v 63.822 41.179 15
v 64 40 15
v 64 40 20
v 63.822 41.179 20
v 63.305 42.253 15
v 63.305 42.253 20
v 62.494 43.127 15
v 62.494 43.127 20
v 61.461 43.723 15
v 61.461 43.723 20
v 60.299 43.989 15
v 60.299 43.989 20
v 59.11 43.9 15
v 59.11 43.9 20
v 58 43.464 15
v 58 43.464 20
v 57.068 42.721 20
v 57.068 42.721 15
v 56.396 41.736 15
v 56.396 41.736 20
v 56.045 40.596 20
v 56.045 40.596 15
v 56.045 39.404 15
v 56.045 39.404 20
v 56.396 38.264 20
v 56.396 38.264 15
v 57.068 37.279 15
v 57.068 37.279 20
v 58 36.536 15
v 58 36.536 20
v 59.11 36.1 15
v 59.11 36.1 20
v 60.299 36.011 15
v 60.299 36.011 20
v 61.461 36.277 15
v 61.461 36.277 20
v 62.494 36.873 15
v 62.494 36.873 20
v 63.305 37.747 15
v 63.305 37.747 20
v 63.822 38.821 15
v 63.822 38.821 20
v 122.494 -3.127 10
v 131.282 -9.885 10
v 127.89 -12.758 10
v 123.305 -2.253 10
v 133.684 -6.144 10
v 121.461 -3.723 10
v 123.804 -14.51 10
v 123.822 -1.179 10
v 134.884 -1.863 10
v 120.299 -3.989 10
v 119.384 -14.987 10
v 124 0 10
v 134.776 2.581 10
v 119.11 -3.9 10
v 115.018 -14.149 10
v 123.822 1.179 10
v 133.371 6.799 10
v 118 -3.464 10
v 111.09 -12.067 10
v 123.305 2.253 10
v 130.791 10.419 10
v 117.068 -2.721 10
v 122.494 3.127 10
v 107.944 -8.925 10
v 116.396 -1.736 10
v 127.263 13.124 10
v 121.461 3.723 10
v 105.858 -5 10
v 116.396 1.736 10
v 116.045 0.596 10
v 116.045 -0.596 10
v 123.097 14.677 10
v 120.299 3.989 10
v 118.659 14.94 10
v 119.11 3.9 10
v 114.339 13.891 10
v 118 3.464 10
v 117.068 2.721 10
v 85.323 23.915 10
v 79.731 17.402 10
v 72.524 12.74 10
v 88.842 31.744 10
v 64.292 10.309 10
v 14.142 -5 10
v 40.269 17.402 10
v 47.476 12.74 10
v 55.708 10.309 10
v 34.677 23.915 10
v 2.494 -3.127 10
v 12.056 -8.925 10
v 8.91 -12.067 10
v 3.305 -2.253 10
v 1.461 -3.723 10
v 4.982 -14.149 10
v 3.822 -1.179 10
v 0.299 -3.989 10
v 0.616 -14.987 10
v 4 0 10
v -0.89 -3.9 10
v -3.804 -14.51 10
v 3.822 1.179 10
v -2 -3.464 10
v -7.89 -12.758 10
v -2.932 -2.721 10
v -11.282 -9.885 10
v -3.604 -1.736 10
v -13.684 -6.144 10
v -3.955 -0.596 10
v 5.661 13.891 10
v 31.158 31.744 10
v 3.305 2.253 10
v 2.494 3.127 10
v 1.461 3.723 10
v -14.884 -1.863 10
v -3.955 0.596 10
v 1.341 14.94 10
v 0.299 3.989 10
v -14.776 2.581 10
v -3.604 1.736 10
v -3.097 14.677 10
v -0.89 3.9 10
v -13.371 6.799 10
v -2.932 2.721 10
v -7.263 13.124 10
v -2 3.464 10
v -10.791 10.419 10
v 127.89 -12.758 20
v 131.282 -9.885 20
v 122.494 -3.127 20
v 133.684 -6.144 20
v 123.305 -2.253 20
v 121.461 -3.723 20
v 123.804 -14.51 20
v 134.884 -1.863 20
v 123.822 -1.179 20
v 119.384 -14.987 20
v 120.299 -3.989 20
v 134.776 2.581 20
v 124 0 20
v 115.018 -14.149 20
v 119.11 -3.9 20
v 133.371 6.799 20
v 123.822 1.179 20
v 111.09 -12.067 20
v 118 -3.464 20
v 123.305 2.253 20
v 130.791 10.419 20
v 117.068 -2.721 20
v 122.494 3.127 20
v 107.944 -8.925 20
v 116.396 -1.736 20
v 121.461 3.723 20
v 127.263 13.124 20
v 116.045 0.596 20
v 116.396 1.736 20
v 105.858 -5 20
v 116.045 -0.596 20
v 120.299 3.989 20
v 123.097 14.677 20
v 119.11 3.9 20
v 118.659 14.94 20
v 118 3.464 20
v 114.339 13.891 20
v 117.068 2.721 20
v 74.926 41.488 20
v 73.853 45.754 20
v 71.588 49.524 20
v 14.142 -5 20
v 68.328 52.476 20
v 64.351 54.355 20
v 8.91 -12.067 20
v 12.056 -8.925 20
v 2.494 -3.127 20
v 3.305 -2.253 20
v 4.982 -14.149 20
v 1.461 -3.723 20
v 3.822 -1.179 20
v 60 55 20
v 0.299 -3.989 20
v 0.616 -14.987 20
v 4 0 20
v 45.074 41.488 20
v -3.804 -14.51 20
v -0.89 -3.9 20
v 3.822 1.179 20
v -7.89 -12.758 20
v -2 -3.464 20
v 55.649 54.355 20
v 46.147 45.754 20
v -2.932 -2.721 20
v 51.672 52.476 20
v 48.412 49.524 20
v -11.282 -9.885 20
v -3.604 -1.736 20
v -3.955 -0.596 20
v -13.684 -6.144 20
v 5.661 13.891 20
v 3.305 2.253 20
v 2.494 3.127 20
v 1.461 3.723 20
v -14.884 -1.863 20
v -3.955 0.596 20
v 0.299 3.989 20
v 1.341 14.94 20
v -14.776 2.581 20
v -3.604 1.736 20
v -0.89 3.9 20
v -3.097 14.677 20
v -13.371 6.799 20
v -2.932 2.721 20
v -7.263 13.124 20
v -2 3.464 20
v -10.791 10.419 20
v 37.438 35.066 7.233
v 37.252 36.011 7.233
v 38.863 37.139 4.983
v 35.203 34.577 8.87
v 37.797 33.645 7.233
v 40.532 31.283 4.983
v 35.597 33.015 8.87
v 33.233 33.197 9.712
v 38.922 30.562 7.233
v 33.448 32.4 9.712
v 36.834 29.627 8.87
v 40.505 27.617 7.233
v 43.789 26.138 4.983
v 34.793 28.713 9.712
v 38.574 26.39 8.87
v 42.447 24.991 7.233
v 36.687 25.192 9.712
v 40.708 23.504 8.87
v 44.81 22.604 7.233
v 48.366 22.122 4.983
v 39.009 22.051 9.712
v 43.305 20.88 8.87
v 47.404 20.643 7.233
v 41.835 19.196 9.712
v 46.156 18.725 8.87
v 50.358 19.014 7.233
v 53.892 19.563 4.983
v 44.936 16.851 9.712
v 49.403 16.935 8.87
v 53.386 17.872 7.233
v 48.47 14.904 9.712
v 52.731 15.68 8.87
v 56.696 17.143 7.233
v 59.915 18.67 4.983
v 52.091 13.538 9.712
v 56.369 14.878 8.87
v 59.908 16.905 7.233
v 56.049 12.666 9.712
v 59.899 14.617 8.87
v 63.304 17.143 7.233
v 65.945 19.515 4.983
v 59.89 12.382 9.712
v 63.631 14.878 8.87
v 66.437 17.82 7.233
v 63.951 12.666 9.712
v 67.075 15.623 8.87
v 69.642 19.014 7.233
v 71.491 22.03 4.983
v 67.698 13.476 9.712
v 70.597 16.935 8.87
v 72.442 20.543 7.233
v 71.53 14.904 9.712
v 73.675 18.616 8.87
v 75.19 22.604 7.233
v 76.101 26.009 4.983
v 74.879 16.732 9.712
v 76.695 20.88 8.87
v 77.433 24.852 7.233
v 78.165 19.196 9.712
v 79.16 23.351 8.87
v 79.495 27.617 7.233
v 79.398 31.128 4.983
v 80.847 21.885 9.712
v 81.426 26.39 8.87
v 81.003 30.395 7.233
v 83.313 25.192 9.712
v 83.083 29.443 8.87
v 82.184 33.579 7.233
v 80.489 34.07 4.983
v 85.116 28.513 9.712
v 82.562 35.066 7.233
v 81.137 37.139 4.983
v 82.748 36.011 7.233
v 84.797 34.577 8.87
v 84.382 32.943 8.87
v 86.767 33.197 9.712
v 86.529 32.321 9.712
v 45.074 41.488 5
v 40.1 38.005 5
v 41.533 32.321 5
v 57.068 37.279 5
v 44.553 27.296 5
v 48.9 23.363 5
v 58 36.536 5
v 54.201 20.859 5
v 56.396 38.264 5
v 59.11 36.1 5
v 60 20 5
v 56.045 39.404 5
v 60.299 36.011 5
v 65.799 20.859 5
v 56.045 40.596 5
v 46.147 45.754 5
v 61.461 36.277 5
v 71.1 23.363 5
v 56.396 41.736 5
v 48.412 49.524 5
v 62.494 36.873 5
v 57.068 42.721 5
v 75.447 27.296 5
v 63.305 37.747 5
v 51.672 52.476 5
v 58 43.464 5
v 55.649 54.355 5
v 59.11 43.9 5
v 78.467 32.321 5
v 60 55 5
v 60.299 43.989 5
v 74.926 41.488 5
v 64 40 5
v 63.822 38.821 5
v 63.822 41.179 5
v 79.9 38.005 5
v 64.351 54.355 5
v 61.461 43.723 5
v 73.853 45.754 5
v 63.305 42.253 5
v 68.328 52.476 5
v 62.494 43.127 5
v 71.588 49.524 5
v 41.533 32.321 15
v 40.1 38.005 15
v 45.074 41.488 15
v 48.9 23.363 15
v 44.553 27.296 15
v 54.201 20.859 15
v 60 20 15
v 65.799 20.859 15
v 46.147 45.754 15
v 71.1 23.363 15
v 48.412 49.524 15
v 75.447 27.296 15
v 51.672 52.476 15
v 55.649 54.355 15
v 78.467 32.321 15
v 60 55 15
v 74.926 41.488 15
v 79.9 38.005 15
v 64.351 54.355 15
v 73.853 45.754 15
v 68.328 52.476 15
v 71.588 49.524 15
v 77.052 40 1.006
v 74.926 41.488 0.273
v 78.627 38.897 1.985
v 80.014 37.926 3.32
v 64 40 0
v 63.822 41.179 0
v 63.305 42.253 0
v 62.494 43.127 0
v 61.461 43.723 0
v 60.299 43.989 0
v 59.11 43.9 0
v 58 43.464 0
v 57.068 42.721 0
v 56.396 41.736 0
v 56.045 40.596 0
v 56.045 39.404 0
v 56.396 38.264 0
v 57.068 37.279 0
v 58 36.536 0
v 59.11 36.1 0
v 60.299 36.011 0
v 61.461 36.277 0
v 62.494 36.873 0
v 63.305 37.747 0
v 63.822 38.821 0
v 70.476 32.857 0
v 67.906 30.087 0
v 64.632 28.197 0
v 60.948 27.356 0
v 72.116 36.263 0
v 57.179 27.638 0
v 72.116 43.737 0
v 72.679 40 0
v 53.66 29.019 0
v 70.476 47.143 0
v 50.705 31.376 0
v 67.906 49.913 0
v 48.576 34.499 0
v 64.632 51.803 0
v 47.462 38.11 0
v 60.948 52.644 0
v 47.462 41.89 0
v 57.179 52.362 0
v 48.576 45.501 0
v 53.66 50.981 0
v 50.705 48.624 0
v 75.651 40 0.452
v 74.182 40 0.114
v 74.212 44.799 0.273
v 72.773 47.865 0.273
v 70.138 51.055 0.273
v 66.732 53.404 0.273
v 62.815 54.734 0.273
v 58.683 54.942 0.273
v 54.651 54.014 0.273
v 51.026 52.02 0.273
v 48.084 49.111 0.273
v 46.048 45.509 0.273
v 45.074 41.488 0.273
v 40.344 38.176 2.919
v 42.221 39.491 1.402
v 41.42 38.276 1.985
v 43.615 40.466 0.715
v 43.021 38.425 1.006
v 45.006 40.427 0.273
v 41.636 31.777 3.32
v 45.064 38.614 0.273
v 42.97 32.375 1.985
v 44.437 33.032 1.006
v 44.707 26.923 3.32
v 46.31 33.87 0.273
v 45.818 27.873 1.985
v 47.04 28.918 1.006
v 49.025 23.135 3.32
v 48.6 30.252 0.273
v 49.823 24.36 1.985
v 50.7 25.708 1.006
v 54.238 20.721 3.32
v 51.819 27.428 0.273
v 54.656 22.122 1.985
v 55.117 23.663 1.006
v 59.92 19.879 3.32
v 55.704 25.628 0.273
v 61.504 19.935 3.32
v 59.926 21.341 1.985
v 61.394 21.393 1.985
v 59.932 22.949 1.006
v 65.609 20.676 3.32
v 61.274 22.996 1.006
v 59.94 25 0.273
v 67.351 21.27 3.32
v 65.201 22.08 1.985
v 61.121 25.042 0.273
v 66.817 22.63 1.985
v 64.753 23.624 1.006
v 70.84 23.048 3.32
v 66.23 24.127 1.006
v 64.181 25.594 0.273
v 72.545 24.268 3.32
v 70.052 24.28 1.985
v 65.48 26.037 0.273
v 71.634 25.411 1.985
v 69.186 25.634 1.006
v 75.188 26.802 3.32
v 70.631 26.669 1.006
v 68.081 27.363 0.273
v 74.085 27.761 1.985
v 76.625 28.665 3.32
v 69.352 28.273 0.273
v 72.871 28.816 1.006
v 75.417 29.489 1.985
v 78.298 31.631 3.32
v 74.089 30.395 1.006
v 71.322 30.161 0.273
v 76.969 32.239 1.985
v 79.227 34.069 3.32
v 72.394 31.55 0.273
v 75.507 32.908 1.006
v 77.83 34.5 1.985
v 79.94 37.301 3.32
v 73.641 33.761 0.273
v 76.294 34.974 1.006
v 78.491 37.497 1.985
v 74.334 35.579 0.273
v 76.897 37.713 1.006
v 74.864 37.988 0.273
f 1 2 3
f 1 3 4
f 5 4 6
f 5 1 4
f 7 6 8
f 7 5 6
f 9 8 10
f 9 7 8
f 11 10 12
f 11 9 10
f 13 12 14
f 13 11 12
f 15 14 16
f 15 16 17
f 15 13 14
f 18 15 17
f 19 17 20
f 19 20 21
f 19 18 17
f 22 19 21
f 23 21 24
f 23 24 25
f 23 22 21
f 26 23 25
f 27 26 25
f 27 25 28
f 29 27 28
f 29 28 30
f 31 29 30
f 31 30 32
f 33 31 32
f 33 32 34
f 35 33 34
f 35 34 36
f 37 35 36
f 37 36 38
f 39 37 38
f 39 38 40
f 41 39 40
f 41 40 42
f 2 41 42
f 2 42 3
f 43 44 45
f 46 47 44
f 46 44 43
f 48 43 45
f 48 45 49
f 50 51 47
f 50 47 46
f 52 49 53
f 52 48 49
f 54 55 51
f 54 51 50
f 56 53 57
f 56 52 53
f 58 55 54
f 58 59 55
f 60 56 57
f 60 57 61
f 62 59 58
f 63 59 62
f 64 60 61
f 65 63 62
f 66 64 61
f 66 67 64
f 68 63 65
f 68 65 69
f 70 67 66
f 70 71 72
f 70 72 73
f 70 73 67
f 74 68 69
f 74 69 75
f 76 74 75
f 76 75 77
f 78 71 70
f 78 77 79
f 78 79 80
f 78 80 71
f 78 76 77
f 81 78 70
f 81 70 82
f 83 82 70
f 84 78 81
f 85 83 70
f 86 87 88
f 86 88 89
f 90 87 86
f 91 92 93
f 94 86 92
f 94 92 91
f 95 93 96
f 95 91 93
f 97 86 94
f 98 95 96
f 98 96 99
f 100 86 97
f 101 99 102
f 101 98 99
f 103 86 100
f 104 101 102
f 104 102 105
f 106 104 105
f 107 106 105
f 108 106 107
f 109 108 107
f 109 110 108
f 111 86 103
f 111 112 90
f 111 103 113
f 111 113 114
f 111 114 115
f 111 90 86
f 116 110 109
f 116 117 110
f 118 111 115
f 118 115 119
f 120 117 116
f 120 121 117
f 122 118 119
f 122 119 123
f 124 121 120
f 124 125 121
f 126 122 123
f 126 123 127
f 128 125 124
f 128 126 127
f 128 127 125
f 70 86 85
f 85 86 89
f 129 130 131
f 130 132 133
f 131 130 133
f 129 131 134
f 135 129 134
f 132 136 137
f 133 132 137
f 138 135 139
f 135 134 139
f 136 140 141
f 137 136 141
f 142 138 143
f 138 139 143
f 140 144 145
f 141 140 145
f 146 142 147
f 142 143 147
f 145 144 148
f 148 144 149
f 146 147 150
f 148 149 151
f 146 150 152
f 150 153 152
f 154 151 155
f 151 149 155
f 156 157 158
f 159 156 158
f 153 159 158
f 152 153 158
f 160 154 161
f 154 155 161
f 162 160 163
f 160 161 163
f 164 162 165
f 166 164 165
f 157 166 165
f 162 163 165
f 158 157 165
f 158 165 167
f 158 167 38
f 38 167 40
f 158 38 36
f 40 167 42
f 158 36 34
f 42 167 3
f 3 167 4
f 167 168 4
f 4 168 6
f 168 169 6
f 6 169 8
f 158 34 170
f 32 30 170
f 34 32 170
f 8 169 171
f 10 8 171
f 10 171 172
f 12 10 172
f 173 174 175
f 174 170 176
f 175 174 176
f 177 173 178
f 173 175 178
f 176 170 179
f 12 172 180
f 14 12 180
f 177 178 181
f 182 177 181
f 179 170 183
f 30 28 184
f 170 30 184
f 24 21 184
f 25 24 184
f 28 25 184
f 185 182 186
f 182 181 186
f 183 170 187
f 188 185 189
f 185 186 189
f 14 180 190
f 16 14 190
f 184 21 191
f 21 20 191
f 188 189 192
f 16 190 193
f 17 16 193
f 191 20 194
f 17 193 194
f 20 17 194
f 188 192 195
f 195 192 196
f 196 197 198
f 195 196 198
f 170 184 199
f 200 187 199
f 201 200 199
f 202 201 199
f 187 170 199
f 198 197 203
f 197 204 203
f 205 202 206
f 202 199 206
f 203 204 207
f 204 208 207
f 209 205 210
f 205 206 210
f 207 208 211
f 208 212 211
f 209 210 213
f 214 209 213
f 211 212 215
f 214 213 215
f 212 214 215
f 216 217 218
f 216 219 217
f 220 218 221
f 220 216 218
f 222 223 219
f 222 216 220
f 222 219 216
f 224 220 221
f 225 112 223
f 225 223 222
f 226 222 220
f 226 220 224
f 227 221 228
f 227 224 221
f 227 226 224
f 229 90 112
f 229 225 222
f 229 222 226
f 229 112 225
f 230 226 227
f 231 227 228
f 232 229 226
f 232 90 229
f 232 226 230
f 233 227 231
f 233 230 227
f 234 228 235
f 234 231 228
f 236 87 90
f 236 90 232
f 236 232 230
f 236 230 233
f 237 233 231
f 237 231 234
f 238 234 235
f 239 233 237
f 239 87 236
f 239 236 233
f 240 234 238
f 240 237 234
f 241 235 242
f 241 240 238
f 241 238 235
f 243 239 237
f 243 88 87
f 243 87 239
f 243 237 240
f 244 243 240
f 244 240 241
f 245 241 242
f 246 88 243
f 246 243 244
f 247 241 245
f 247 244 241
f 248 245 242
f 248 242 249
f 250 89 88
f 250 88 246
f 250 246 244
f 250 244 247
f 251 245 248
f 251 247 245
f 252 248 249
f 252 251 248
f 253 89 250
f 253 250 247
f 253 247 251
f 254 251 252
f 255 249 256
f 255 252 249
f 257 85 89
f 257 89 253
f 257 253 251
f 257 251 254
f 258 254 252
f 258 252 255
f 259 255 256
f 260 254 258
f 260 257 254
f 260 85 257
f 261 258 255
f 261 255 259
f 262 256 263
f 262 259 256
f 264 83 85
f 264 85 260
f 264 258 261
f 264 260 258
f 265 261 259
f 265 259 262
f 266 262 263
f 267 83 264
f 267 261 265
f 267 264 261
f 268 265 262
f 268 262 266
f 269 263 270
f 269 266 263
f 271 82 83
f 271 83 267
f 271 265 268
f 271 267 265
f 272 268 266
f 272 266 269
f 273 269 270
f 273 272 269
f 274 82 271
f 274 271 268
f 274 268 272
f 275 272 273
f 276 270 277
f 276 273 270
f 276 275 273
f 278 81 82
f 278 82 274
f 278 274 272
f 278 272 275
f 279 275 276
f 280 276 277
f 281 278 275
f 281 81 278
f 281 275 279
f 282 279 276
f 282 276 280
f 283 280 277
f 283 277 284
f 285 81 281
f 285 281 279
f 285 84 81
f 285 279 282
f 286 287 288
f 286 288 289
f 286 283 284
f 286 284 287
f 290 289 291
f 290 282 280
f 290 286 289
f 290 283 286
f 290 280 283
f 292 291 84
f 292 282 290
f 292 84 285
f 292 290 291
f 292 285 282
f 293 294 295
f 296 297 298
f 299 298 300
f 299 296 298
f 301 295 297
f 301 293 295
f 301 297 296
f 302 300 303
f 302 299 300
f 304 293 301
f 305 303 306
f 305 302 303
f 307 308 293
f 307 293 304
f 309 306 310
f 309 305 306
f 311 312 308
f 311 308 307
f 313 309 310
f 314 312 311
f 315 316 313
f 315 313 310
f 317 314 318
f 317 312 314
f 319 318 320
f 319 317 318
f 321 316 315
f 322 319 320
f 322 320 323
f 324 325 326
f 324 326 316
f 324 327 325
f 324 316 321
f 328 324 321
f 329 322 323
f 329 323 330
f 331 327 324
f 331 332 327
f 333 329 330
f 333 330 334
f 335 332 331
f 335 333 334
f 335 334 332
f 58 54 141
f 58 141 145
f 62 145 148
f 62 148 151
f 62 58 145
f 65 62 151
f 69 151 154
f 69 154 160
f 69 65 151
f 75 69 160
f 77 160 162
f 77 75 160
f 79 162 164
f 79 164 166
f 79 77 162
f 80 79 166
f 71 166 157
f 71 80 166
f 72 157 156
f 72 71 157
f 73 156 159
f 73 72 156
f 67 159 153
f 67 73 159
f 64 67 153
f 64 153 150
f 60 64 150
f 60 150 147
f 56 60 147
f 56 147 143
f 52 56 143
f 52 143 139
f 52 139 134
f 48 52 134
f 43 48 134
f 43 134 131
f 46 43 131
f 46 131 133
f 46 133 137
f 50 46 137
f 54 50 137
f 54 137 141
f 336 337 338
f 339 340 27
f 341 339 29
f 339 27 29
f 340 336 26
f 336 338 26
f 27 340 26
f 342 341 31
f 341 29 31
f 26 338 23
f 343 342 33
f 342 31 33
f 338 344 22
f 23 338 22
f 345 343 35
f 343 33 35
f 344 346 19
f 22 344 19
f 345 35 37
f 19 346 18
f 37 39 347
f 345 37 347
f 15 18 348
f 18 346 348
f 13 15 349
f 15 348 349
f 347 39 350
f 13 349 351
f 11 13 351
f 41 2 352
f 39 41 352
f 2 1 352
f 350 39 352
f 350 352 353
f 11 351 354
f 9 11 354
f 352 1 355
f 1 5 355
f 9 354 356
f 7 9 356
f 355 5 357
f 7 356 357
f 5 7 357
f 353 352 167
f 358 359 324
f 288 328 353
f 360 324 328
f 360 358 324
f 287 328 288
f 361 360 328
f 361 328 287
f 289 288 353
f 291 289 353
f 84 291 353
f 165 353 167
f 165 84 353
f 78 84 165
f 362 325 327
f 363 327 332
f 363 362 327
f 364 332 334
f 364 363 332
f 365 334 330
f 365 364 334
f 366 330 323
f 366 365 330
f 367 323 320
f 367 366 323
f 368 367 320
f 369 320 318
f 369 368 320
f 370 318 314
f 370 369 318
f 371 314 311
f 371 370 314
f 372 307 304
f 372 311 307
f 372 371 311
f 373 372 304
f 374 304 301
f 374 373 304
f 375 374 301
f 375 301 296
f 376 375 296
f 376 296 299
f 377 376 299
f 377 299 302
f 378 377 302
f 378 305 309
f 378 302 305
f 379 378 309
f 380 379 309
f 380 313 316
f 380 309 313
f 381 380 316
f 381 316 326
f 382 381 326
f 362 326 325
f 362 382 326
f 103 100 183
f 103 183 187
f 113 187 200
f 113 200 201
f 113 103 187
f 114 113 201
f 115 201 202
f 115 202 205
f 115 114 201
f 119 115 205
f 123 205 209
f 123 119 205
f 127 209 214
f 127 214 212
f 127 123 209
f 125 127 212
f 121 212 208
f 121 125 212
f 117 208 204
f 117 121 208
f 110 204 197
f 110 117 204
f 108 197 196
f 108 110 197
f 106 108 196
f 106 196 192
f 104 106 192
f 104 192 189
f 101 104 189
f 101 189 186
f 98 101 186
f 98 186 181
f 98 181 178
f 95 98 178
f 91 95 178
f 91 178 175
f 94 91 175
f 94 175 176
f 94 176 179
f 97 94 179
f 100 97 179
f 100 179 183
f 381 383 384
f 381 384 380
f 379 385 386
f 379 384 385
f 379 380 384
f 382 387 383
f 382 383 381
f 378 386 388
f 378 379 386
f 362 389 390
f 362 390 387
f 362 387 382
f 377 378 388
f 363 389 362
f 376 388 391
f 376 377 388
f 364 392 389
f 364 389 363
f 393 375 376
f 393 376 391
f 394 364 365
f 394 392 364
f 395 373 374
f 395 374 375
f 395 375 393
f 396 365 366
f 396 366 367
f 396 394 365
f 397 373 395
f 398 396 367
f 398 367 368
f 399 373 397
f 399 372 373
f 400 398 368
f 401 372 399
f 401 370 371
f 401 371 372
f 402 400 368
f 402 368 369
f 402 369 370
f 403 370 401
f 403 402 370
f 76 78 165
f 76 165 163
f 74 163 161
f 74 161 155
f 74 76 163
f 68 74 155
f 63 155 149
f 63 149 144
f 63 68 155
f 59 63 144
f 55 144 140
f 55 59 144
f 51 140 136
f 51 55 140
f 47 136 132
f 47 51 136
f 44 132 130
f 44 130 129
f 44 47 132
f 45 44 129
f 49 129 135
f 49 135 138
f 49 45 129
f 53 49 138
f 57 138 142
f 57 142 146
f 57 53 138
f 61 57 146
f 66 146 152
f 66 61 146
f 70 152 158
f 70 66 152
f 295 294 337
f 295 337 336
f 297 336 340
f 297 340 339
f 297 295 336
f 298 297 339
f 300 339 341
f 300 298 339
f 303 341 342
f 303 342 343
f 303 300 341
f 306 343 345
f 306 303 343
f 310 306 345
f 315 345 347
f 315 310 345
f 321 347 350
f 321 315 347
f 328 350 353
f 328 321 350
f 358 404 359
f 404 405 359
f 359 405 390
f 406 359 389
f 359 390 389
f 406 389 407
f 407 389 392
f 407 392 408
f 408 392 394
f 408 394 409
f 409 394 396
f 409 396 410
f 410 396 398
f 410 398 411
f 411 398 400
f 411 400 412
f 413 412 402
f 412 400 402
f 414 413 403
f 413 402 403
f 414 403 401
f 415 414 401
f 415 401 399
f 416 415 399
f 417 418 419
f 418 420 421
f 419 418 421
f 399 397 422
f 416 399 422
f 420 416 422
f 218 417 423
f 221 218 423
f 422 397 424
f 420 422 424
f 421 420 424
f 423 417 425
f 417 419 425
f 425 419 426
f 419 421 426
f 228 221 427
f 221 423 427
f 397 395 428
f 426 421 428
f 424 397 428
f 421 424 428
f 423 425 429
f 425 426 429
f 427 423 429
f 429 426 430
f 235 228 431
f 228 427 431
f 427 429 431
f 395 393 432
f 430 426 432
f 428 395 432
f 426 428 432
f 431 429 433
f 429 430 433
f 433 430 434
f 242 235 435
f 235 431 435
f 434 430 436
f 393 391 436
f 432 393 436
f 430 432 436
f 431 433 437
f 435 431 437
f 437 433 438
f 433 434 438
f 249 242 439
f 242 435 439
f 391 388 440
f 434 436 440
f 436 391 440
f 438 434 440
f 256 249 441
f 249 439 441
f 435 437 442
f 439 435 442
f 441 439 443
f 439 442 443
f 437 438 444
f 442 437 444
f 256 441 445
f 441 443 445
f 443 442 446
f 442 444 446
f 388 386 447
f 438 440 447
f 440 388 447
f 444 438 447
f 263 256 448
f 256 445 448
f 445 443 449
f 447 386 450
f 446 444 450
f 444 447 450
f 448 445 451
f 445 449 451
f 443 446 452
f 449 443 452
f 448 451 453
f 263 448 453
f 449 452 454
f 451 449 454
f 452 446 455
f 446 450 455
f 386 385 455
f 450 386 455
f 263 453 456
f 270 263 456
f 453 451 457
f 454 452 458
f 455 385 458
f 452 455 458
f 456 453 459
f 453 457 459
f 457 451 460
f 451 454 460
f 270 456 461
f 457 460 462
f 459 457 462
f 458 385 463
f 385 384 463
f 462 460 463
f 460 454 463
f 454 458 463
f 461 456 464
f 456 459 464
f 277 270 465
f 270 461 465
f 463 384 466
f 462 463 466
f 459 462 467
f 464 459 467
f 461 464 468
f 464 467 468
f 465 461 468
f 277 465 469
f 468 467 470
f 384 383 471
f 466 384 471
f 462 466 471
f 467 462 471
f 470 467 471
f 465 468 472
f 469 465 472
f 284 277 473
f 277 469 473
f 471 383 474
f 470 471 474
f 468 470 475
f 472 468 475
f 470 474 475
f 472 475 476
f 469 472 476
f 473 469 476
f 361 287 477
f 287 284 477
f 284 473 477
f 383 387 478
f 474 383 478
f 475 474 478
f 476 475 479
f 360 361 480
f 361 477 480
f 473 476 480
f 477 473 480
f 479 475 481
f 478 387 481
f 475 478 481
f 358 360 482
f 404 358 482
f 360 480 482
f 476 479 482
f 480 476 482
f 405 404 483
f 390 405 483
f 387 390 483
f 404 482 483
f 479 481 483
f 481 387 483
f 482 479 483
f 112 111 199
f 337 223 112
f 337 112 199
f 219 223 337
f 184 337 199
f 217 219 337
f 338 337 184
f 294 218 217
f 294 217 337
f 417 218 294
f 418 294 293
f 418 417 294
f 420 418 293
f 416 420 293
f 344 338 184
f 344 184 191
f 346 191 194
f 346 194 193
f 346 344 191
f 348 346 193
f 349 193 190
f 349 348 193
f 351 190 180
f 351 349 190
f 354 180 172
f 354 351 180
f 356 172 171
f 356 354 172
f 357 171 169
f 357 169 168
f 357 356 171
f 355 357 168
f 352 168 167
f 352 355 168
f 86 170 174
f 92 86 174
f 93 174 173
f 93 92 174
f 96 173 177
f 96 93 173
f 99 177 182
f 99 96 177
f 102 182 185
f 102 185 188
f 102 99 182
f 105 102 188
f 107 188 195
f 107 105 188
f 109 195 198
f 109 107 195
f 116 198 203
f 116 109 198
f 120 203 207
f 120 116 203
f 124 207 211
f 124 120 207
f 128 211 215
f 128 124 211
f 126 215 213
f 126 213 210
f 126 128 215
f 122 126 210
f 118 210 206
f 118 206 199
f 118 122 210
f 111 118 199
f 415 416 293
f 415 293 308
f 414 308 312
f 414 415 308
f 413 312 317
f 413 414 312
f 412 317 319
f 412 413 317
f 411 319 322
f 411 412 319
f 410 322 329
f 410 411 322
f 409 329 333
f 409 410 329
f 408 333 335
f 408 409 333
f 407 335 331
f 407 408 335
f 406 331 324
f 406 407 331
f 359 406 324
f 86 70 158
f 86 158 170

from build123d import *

# Parameters (mm, degrees)
SKETCH1_R               = 4
BOSS_EXTRUDE1_DEPTH     = 20
SKETCH2_R               = 4
CUT_EXTRUDE1_DEPTH      = 10
FILLET2_R               = 10
CUT_EXTRUDE2_DEPTH      = 5
CUT_EXTRUDE2_DEPTH_BACK = 5
SKETCH5_R               = 20


with BuildPart() as part:
    # Sketch1 → Boss-Extrude1 (new body)
    with BuildSketch(Plane.XY):
        with BuildLine():
            Line((5.660747058, 13.890858244), (45.074020085, 41.488329122))
            ThreePointArc((45.074020085, 41.488329122), (60, 55), (74.925979915, 41.488329122))
            Line((74.925979915, 41.488329122), (114.339252942, 13.890858244))
            ThreePointArc((114.339252942, 13.890858244), (133.684102891, -6.143722656), (105.857864376, -5))
            Line((105.857864376, -5), (14.142135624, -5))
            ThreePointArc((14.142135624, -5), (-13.684102891, -6.143722656), (5.660747058, 13.890858244))
        make_face()
        with Locations((60, 40)):
            Circle(SKETCH1_R, mode=Mode.SUBTRACT)
        with Locations((120, 0)):
            Circle(SKETCH1_R, mode=Mode.SUBTRACT)
        Circle(SKETCH1_R, mode=Mode.SUBTRACT)
    extrude(amount=BOSS_EXTRUDE1_DEPTH)

    # Sketch2 → Cut-Extrude1 (cut)
    with BuildSketch(Plane(origin=(0, 0, 0), x_dir=(-1, 0, 0), z_dir=(0, 0, -1))):
        with BuildLine():
            ThreePointArc((-40.099720592, 38.00528712), (-60, 20), (-79.900279408, 38.00528712))
            Line((-79.900279408, 38.00528712), (-114.339252942, 13.890858244))
            ThreePointArc((-114.339252942, 13.890858244), (-133.684102891, -6.143722656), (-105.857864376, -5))
            Line((-105.857864376, -5), (-14.142135624, -5))
            ThreePointArc((-14.142135624, -5), (13.684102891, -6.143722656), (-5.660747058, 13.890858244))
            Line((-5.660747058, 13.890858244), (-40.099720592, 38.00528712))
        make_face()
        with Locations((-120, 0)):
            Circle(SKETCH2_R, mode=Mode.SUBTRACT)
        Circle(SKETCH2_R, mode=Mode.SUBTRACT)
    extrude(amount=-CUT_EXTRUDE1_DEPTH, mode=Mode.SUBTRACT)

    # Fillet2
    fillet2_edges = [part.edges().sort_by_distance(p)[0] for p in [
        (60, 20, 10),
    ]]
    fillet(fillet2_edges, radius=FILLET2_R - 0.0001)  # a hair under: the kernel refuses the full size

    # Fillet3: read off the stored shape, not the designer's step
    # Fillet3 outline → Fillet3 (revolve, cut)
    with BuildSketch(Plane(origin=(60, 40, 0), x_dir=(1, 0, 0), z_dir=(0, -1, 0))):
        with BuildLine():
            Line((21.33974599, 0), (21.33974599, 5.000000048))
            ThreePointArc((21.33974599, 5.000000048), (17.679491948, 1.339745976), (12.679491924, 0))
            Line((12.679491924, 0), (21.33974599, 0))
        make_face()
    revolve(axis=Axis((60, 40, 0), (0, 0, 1)), mode=Mode.SUBTRACT)

    # Sketch5 → Cut-Extrude2 (cut, two sides: drawn at the far end of the back side and taken through both)
    with BuildSketch(Plane.XY.offset(10).offset(-CUT_EXTRUDE2_DEPTH_BACK)):
        with Locations((60, 40)):
            Circle(SKETCH5_R)
    extrude(amount=CUT_EXTRUDE2_DEPTH + CUT_EXTRUDE2_DEPTH_BACK, mode=Mode.SUBTRACT)


solid = part.part
